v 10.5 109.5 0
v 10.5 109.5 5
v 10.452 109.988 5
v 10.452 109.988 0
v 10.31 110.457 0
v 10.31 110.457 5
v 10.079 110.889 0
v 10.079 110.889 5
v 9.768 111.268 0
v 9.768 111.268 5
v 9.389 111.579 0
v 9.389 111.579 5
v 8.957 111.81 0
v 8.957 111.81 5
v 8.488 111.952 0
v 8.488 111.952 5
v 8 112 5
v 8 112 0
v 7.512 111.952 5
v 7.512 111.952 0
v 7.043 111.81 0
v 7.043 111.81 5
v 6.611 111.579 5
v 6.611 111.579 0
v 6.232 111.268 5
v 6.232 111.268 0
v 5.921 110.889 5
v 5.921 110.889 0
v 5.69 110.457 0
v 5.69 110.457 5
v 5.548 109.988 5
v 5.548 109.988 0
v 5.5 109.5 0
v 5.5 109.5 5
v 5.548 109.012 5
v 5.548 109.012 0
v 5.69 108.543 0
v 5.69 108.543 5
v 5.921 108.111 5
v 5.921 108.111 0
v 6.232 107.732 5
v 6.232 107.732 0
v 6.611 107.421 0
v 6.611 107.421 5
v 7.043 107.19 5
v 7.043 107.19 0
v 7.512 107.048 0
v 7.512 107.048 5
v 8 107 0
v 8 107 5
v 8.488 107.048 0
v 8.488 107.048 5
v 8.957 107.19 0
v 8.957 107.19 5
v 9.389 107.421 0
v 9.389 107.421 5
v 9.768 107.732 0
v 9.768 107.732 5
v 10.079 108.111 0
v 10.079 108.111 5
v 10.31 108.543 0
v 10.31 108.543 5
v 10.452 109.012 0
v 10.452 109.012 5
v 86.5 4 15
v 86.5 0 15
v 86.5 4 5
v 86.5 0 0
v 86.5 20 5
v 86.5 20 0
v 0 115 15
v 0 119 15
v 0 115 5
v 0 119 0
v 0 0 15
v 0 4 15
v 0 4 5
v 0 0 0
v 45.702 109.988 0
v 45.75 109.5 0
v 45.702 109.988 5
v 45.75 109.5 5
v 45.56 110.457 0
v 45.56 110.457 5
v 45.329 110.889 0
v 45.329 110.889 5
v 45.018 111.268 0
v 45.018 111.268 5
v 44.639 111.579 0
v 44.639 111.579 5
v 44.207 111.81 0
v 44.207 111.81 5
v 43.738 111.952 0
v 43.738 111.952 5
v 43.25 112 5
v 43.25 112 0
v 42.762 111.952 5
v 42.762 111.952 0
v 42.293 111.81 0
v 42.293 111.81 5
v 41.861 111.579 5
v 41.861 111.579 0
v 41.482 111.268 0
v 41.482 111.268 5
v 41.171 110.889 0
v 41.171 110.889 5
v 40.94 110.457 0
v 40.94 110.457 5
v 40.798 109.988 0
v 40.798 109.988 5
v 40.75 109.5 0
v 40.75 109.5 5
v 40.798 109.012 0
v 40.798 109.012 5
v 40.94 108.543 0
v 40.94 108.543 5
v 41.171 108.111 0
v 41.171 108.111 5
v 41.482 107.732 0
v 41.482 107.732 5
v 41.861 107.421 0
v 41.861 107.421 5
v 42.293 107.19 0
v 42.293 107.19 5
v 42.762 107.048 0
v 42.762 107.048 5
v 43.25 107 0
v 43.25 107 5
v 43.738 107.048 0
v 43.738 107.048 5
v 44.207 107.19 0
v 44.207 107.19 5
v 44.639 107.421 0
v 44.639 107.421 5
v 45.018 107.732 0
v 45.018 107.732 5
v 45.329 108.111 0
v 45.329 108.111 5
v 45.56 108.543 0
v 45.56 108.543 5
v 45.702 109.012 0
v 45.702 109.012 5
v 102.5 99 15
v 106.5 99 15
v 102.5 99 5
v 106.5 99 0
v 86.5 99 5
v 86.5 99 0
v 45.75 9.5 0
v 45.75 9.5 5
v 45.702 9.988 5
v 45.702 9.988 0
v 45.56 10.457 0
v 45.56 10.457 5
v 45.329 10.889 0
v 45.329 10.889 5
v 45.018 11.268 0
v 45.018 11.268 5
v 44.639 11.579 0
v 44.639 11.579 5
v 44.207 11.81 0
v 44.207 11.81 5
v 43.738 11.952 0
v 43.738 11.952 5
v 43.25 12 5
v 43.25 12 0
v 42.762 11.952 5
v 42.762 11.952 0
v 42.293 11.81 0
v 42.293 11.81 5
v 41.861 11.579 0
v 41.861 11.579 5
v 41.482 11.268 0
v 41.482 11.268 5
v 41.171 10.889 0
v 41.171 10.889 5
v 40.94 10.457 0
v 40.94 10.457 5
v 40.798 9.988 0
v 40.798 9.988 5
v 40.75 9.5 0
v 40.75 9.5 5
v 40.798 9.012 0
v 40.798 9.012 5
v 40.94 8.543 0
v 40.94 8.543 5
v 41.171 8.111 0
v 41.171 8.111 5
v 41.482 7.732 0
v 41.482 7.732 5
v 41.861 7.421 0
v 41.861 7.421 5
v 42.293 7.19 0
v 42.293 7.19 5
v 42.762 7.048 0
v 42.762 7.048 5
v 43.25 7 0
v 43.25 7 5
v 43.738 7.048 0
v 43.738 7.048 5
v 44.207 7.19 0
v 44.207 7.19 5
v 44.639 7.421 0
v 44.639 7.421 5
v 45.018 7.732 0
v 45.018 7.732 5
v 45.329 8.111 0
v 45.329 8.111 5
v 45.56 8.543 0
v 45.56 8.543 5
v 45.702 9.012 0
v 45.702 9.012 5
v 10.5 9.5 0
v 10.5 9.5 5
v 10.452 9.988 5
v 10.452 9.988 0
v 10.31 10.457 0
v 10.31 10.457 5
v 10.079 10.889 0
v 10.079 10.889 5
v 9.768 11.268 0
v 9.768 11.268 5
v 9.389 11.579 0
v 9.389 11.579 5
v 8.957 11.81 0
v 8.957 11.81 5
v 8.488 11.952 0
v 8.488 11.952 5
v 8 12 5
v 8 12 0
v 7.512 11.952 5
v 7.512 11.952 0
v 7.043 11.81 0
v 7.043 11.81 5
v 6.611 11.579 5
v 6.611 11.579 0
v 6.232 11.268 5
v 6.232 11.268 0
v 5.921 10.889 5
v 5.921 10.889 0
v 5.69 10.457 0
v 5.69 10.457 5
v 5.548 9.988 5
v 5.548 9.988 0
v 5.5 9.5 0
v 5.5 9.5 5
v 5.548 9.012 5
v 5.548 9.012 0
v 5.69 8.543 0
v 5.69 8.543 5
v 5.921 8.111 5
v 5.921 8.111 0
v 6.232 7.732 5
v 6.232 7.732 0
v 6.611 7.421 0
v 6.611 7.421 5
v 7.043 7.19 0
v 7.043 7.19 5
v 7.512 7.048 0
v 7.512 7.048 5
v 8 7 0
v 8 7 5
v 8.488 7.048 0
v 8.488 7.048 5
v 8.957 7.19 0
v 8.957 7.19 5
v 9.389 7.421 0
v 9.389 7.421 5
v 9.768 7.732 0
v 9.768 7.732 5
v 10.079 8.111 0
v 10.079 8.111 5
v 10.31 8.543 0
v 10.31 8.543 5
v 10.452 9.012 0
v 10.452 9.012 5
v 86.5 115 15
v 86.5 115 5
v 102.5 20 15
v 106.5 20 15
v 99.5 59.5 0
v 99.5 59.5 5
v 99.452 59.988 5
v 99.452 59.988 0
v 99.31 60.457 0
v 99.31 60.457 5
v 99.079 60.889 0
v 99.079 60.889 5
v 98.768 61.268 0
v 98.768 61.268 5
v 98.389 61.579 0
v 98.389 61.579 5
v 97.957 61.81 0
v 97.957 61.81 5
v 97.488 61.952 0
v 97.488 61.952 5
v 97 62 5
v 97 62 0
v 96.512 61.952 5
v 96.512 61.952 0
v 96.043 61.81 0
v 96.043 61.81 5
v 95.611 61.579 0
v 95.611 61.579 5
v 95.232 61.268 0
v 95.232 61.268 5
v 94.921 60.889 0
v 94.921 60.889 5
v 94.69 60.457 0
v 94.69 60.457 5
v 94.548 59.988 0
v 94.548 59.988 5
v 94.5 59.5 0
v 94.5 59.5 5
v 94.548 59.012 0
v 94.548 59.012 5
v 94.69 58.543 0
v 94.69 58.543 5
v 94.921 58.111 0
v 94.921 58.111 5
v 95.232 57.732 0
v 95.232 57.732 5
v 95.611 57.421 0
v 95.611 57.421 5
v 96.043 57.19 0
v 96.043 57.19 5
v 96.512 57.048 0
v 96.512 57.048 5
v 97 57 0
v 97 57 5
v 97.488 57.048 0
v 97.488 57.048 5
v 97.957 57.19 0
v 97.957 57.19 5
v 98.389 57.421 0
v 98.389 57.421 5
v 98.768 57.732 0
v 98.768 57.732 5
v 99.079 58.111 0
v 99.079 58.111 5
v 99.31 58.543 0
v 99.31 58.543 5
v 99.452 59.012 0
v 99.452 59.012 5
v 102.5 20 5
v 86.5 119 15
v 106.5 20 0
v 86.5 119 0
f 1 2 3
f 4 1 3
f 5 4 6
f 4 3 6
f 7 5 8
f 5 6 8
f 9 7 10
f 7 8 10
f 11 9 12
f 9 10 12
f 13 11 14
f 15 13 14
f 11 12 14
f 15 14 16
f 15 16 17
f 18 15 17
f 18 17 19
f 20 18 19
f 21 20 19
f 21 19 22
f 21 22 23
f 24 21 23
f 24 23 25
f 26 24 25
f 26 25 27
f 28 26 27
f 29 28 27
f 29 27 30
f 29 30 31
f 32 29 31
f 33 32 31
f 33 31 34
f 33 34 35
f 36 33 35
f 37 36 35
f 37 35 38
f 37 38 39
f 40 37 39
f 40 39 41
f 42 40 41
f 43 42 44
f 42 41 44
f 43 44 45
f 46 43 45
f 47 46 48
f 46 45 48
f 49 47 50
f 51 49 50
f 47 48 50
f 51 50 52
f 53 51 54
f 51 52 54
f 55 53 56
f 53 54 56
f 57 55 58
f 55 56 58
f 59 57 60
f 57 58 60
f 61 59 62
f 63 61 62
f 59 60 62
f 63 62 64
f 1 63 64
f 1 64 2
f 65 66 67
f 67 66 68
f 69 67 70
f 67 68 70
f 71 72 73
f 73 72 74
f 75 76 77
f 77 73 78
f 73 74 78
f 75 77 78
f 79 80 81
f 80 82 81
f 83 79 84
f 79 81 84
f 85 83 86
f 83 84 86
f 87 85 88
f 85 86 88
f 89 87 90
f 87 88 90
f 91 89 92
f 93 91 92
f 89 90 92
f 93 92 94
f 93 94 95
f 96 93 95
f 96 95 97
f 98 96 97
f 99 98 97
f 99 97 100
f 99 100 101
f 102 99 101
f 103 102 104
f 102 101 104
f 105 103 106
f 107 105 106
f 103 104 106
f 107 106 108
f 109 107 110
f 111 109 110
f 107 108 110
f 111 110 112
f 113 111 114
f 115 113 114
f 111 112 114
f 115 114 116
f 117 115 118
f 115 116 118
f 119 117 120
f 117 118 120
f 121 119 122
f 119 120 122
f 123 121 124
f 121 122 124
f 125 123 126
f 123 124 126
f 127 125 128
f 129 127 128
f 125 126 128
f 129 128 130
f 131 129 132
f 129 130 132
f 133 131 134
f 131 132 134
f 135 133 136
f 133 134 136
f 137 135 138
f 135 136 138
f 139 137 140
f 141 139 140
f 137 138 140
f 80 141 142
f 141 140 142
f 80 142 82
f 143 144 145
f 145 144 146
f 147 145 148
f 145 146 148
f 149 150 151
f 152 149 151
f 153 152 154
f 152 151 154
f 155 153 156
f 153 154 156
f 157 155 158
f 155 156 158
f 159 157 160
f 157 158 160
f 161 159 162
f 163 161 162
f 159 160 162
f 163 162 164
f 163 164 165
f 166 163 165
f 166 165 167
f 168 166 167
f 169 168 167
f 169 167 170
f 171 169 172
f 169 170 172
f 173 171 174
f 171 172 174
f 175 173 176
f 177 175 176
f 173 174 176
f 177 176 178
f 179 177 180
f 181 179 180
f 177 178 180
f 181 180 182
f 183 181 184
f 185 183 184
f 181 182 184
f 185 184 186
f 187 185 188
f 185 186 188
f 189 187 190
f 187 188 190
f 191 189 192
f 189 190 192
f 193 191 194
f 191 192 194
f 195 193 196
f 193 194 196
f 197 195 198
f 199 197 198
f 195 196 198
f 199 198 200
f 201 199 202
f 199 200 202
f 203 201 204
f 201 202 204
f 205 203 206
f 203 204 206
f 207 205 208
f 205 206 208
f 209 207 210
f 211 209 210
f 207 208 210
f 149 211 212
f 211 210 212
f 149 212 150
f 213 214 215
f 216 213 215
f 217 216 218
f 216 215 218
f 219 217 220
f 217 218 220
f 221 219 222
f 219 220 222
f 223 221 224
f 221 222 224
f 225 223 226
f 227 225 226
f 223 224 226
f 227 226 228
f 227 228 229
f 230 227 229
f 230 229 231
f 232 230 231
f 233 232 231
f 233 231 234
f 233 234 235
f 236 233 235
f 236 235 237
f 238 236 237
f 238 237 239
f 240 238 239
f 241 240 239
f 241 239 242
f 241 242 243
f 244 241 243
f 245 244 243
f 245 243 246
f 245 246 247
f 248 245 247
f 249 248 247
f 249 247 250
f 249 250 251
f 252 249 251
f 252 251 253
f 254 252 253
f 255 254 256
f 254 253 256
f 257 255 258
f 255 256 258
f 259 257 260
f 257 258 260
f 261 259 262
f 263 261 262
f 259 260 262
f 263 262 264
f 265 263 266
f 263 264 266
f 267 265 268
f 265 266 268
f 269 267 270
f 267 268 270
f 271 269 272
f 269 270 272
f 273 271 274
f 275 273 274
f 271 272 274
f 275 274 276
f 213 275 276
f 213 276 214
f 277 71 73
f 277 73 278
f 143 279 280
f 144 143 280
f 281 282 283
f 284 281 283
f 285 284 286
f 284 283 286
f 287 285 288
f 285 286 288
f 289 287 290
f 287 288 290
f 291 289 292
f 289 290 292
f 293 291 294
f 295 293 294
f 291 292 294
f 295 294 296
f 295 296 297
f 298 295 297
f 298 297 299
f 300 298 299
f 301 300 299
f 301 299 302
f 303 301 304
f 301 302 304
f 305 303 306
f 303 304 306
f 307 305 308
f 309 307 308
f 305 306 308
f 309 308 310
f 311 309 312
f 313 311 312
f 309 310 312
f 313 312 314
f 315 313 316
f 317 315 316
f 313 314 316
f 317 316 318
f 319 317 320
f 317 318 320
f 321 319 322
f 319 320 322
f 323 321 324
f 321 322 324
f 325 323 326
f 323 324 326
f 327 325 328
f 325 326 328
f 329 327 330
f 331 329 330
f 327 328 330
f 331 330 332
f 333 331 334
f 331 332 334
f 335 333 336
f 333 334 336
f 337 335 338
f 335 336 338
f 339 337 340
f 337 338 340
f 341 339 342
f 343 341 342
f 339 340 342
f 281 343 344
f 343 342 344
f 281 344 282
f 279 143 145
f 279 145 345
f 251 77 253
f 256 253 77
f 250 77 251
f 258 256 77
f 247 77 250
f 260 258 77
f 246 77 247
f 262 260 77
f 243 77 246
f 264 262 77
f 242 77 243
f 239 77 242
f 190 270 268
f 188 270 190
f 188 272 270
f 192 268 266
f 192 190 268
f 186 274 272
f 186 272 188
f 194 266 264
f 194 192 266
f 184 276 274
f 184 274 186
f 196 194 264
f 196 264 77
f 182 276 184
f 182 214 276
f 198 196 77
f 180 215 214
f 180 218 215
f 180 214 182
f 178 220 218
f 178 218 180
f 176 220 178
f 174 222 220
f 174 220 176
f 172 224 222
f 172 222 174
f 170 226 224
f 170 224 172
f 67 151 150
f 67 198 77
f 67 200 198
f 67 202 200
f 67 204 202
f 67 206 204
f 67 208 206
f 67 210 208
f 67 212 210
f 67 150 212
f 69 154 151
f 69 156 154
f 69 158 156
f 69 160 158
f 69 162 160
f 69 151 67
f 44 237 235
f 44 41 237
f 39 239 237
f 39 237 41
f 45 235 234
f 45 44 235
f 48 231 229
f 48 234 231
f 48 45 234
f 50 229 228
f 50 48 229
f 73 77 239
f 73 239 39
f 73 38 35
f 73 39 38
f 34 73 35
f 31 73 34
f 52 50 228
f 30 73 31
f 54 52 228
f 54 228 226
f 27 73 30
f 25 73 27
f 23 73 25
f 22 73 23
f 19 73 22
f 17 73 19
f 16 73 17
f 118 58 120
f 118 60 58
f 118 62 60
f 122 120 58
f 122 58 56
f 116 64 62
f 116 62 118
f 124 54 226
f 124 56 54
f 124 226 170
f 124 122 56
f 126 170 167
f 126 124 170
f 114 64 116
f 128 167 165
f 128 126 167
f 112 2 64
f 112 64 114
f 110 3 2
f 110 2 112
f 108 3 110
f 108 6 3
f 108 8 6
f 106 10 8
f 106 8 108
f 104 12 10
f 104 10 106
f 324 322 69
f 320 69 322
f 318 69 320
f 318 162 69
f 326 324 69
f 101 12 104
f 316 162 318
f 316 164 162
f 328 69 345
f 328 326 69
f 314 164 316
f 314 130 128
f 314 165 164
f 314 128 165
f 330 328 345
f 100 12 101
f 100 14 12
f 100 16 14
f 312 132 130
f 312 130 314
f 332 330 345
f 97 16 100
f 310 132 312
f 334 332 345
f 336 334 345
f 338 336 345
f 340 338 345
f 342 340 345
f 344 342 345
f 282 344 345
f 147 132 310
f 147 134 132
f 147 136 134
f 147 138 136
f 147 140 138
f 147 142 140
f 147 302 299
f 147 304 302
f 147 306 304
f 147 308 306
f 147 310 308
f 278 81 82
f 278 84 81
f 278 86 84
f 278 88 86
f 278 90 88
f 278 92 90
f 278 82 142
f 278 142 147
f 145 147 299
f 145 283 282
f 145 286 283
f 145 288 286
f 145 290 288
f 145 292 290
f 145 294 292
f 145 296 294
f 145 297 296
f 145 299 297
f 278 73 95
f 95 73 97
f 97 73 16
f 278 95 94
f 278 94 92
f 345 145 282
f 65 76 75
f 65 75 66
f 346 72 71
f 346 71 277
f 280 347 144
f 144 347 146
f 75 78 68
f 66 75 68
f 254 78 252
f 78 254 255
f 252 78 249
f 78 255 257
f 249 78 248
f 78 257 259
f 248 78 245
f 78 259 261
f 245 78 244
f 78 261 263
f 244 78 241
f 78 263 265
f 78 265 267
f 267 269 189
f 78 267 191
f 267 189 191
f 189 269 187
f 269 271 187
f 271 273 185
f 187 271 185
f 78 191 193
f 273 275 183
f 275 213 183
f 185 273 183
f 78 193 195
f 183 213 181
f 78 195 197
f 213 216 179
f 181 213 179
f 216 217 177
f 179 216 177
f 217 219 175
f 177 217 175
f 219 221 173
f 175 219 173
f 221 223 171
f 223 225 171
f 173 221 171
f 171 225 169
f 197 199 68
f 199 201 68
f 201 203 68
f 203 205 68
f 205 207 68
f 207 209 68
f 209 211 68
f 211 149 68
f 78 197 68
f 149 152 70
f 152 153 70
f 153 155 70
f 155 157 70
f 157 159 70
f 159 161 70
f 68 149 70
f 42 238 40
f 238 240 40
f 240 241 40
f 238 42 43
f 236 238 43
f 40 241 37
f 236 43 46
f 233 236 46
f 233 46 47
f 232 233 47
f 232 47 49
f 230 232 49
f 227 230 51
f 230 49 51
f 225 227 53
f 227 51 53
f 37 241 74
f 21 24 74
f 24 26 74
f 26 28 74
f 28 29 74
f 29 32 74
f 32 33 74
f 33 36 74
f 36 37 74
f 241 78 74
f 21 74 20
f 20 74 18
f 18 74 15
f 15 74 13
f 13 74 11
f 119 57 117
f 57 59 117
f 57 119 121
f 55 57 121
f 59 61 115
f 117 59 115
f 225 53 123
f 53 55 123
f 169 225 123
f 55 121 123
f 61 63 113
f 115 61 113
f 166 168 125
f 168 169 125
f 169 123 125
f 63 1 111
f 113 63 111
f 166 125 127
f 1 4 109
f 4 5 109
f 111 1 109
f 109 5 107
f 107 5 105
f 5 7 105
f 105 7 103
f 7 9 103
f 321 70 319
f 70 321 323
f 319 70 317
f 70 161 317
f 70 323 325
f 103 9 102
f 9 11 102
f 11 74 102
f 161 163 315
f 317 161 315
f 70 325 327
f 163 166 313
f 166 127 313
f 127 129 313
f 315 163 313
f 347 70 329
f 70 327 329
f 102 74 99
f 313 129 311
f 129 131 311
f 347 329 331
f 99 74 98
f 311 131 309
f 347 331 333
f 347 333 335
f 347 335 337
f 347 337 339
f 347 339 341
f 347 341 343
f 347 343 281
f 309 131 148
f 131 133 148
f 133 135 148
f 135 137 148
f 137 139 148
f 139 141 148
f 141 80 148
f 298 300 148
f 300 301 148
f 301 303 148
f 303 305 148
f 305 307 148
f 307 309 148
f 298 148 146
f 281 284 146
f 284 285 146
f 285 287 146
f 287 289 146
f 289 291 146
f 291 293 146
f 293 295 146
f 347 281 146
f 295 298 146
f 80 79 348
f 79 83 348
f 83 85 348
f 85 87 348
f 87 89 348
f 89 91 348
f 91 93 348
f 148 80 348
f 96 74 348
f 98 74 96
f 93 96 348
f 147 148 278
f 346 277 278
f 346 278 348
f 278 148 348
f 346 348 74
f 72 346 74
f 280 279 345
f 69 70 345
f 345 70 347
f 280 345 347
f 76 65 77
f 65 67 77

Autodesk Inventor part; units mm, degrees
ref_plane "YZ Plane" through (0, 0, 0) normal (1, 0, 0) x (0, 1, 0)
ref_plane "XZ Plane" through (0, 0, 0) normal (0, 1, 0) x (-1, 0, 0)
ref_plane "XY Plane" through (0, 0, 0) normal (0, 0, 1) x (1, 0, 0)
sketch "Sketch1" plane through (0, 0, 0) normal (0, 0, 1) x (1, 0, 0)
  line L0 (0, 0) -> (106.5, 0) construction
  line L1 (106.5, 0) -> (106.5, 119) construction
  line L2 (106.5, 119) -> (0, 119) construction
  line L3 (0, 119) -> (0, 0) construction
  line L4 (106.5, 119) -> (86.5, 119) construction
  line L5 (86.5, 119) -> (86.5, 99) construction
  line L6 (86.5, 99) -> (106.5, 99) construction
  line L7 (106.5, 99) -> (106.5, 119) construction
  line L8 (106.5, 0) -> (86.5, 0) construction
  line L9 (86.5, 0) -> (86.5, 20) construction
  line L10 (86.5, 20) -> (106.5, 20) construction
  line L11 (106.5, 20) -> (106.5, 0) construction
  line L12 (0, 119) -> (86.5, 119)
  line L13 (86.5, 119) -> (86.5, 99)
  line L14 (86.5, 99) -> (106.5, 99)
  line L15 (106.5, 20) -> (86.5, 20)
  line L16 (86.5, 0) -> (86.5, 20)
  line L17 (86.5, 0) -> (0, 0)
  line L18 (0, 0) -> (0, 119)
  line L19 (106.5, 99) -> (106.5, 20)
  dimension "d0" = 106.5
  dimension "d1" = 119
  dimension "d2" = 20
  dimension "d3" = 20
  dimension "d4" = 20
  dimension "d5" = 20
extrude "Extrusion1" add sketch "Sketch1" along normal blind 5
sketch "Sketch2" plane through (0, 0, 5) normal (0, 0, 1) x (1, 0, 0)
  circle A0 centre (43.25, 9.5) radius 2.5
  circle A1 centre (97, 59.5) radius 2.5
  circle A2 centre (43.25, 109.5) radius 2.5
  line L0 (86.5, 119) -> (0, 119) projected
  line L1 (0, 0) -> (86.5, 0) projected
  line L2 (106.5, 20) -> (106.5, 99) projected
  circle A3 centre (8, 109.5) radius 2.5
  circle A4 centre (8, 9.5) radius 2.5
  line L3 (0, 119) -> (0, 0) projected
  point P0 (106.5, 59.5)
  point P1 (43.25, 119)
  point P2 (43.25, 0)
  dimension "d8" = 5
  dimension "d9" = 5
  dimension "d10" = 5
  dimension "d11" = 9.5
  dimension "d12" = 9.5
  dimension "d13" = 9.5
  dimension "d21" = 5
  dimension "d22" = 5
  dimension "d23" = 8
extrude "Extrusion2" cut sketch "Sketch2" against normal through all
sketch "Sketch3" plane through (0, 0, 5) normal (0, 0, 1) x (1, 0, 0)
  line L0 (86.5, 119) -> (0, 119) projected
  line L1 (86.5, 99) -> (86.5, 119) projected
  line L2 (106.5, 99) -> (86.5, 99) projected
  line L3 (106.5, 20) -> (106.5, 99) projected
  line L4 (86.5, 20) -> (106.5, 20) projected
  line L5 (86.5, 0) -> (86.5, 20) projected
  line L6 (0, 0) -> (86.5, 0) projected
  line L7 (0, 115) -> (82.5, 115)
  line L8 (82.5, 115) -> (82.5, 95)
  line L9 (82.5, 95) -> (102.5, 95)
  line L10 (102.5, 95) -> (102.5, 24)
  line L11 (102.5, 24) -> (82.5, 24)
  line L12 (82.5, 24) -> (82.5, 4)
  line L13 (82.5, 4) -> (0, 4)
  line L14 (0, 119) -> (0, 115)
  line L15 (0, 119) -> (0, 0) projected
  line L16 (0, 4) -> (0, 0)
  dimension "d16" = 4
extrude "Extrusion3" add sketch "Sketch3" along normal blind 10 contours L1 L2 L3 L4 L5 L6 L15 L13 L12 L11 L10 L9 L8 L7 L14 L0
sketch "Sketch4" plane through (0, 0, 15) normal (0, 0, 1) x (1, 0, 0)
  line L0 (82.5, 115) -> (0, 115) projected
  line L1 (82.5, 115) -> (102.5, 115)
  line L2 (102.5, 115) -> (102.5, 4)
  line L3 (102.5, 4) -> (82.5, 4)
  line L4 (82.5, 4) -> (82.5, 115)
  point P0 (0, 0)
  point P1 (102.5, 95)
extrude "Extrusion4" cut sketch "Sketch4" against normal blind 10
properties part number "BB001" material "ABS Plastic"
